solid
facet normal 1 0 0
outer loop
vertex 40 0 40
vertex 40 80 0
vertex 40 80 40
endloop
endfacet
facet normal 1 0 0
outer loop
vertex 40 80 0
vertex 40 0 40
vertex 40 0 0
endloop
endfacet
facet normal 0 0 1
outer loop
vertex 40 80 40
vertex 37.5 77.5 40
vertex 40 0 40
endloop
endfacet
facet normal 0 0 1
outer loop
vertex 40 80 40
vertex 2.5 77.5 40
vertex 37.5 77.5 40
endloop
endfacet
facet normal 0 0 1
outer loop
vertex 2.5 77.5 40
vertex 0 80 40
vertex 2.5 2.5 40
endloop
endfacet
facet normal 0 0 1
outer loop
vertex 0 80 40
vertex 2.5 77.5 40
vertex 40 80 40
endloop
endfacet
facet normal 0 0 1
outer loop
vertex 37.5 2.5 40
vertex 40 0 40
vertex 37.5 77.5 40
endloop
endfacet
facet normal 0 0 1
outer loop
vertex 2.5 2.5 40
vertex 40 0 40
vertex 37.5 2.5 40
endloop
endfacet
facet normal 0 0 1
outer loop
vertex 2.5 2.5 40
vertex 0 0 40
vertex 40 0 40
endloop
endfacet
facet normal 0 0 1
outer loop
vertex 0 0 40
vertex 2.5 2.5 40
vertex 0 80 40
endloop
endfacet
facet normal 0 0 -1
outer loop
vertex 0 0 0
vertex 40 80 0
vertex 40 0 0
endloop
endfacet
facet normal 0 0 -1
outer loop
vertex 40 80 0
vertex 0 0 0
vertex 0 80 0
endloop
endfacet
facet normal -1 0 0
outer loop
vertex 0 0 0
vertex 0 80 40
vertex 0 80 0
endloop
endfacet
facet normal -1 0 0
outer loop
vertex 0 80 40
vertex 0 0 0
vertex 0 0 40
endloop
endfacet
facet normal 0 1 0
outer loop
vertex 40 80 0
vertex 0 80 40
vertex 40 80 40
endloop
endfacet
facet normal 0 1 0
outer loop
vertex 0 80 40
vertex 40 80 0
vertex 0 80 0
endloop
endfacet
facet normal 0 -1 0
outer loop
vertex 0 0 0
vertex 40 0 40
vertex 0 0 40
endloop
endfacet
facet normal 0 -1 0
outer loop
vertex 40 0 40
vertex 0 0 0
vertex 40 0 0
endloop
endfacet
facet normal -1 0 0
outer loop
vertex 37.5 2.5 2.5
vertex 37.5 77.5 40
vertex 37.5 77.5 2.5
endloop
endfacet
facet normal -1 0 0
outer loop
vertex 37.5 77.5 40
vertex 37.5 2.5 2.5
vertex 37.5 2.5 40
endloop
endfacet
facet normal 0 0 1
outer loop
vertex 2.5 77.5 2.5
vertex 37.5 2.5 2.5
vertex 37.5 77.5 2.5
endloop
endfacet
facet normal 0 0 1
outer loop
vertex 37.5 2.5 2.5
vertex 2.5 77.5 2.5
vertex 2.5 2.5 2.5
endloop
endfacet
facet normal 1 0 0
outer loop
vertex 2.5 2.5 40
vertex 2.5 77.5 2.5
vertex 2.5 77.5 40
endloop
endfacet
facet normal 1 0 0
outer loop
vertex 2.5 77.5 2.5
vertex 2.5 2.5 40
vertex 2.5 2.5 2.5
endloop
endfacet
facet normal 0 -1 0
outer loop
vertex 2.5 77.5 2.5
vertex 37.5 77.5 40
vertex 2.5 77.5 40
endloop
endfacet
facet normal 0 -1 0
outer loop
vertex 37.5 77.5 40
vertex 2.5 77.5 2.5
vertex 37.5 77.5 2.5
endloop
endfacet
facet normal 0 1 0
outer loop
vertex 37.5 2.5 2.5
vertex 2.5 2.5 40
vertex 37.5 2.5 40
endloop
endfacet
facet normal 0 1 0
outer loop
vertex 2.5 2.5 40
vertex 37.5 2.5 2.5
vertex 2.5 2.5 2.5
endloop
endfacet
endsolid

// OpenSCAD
// Generated by Text-to-CAD from prompt:
// a project enclosure 120 x 80 x 40 mm
$fn = 64;

module Enclosure() {
difference() {
    cube([40, 80, 40]);
    translate([2.5, 2.5, 2.5]) {
        cube([35, 75, 40]);
    }
}
}

Enclosure();
